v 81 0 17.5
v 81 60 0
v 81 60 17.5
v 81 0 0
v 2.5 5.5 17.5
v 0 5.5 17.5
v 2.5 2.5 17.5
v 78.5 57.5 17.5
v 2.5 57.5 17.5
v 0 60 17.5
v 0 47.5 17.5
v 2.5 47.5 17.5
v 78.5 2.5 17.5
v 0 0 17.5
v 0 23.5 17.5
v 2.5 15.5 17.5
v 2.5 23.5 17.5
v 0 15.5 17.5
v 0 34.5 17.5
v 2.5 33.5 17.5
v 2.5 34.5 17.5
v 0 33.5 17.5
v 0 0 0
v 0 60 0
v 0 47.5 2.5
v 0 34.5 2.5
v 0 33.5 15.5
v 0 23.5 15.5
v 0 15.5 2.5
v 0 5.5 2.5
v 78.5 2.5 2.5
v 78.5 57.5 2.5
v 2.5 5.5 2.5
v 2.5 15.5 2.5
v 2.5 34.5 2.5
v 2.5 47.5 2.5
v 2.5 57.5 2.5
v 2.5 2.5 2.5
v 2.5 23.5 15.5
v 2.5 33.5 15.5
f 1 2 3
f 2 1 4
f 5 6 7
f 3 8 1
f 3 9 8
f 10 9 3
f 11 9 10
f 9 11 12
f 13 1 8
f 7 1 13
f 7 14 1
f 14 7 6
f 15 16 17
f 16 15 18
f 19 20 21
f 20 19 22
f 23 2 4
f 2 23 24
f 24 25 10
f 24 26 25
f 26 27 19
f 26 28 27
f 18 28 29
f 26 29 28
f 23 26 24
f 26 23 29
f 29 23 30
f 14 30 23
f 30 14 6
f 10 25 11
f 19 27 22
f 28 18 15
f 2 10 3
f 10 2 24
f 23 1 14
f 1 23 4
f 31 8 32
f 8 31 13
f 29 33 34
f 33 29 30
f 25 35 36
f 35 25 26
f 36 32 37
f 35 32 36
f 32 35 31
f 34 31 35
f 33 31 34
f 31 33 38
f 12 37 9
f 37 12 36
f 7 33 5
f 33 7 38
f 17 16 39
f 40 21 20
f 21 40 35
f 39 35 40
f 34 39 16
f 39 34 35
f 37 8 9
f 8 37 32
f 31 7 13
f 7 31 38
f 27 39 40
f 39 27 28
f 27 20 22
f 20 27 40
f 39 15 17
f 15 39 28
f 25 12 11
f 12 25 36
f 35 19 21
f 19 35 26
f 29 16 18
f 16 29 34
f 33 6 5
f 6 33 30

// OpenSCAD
difference(){
    cube([81, 60, 17.5], center=0);
    translate([2.5, 2.5, 2.5])
    cube([76, 55, 15], center=0);
    translate([0, 23.5, 15.5])
    cube([40, 10, 10], center=0);
    translate([0, 34.5, 2.5])
    cube([40, 13, 16], center=0);
    translate([0, 5.5, 2.5])
    cube([40, 10, 16], center=0);
}
